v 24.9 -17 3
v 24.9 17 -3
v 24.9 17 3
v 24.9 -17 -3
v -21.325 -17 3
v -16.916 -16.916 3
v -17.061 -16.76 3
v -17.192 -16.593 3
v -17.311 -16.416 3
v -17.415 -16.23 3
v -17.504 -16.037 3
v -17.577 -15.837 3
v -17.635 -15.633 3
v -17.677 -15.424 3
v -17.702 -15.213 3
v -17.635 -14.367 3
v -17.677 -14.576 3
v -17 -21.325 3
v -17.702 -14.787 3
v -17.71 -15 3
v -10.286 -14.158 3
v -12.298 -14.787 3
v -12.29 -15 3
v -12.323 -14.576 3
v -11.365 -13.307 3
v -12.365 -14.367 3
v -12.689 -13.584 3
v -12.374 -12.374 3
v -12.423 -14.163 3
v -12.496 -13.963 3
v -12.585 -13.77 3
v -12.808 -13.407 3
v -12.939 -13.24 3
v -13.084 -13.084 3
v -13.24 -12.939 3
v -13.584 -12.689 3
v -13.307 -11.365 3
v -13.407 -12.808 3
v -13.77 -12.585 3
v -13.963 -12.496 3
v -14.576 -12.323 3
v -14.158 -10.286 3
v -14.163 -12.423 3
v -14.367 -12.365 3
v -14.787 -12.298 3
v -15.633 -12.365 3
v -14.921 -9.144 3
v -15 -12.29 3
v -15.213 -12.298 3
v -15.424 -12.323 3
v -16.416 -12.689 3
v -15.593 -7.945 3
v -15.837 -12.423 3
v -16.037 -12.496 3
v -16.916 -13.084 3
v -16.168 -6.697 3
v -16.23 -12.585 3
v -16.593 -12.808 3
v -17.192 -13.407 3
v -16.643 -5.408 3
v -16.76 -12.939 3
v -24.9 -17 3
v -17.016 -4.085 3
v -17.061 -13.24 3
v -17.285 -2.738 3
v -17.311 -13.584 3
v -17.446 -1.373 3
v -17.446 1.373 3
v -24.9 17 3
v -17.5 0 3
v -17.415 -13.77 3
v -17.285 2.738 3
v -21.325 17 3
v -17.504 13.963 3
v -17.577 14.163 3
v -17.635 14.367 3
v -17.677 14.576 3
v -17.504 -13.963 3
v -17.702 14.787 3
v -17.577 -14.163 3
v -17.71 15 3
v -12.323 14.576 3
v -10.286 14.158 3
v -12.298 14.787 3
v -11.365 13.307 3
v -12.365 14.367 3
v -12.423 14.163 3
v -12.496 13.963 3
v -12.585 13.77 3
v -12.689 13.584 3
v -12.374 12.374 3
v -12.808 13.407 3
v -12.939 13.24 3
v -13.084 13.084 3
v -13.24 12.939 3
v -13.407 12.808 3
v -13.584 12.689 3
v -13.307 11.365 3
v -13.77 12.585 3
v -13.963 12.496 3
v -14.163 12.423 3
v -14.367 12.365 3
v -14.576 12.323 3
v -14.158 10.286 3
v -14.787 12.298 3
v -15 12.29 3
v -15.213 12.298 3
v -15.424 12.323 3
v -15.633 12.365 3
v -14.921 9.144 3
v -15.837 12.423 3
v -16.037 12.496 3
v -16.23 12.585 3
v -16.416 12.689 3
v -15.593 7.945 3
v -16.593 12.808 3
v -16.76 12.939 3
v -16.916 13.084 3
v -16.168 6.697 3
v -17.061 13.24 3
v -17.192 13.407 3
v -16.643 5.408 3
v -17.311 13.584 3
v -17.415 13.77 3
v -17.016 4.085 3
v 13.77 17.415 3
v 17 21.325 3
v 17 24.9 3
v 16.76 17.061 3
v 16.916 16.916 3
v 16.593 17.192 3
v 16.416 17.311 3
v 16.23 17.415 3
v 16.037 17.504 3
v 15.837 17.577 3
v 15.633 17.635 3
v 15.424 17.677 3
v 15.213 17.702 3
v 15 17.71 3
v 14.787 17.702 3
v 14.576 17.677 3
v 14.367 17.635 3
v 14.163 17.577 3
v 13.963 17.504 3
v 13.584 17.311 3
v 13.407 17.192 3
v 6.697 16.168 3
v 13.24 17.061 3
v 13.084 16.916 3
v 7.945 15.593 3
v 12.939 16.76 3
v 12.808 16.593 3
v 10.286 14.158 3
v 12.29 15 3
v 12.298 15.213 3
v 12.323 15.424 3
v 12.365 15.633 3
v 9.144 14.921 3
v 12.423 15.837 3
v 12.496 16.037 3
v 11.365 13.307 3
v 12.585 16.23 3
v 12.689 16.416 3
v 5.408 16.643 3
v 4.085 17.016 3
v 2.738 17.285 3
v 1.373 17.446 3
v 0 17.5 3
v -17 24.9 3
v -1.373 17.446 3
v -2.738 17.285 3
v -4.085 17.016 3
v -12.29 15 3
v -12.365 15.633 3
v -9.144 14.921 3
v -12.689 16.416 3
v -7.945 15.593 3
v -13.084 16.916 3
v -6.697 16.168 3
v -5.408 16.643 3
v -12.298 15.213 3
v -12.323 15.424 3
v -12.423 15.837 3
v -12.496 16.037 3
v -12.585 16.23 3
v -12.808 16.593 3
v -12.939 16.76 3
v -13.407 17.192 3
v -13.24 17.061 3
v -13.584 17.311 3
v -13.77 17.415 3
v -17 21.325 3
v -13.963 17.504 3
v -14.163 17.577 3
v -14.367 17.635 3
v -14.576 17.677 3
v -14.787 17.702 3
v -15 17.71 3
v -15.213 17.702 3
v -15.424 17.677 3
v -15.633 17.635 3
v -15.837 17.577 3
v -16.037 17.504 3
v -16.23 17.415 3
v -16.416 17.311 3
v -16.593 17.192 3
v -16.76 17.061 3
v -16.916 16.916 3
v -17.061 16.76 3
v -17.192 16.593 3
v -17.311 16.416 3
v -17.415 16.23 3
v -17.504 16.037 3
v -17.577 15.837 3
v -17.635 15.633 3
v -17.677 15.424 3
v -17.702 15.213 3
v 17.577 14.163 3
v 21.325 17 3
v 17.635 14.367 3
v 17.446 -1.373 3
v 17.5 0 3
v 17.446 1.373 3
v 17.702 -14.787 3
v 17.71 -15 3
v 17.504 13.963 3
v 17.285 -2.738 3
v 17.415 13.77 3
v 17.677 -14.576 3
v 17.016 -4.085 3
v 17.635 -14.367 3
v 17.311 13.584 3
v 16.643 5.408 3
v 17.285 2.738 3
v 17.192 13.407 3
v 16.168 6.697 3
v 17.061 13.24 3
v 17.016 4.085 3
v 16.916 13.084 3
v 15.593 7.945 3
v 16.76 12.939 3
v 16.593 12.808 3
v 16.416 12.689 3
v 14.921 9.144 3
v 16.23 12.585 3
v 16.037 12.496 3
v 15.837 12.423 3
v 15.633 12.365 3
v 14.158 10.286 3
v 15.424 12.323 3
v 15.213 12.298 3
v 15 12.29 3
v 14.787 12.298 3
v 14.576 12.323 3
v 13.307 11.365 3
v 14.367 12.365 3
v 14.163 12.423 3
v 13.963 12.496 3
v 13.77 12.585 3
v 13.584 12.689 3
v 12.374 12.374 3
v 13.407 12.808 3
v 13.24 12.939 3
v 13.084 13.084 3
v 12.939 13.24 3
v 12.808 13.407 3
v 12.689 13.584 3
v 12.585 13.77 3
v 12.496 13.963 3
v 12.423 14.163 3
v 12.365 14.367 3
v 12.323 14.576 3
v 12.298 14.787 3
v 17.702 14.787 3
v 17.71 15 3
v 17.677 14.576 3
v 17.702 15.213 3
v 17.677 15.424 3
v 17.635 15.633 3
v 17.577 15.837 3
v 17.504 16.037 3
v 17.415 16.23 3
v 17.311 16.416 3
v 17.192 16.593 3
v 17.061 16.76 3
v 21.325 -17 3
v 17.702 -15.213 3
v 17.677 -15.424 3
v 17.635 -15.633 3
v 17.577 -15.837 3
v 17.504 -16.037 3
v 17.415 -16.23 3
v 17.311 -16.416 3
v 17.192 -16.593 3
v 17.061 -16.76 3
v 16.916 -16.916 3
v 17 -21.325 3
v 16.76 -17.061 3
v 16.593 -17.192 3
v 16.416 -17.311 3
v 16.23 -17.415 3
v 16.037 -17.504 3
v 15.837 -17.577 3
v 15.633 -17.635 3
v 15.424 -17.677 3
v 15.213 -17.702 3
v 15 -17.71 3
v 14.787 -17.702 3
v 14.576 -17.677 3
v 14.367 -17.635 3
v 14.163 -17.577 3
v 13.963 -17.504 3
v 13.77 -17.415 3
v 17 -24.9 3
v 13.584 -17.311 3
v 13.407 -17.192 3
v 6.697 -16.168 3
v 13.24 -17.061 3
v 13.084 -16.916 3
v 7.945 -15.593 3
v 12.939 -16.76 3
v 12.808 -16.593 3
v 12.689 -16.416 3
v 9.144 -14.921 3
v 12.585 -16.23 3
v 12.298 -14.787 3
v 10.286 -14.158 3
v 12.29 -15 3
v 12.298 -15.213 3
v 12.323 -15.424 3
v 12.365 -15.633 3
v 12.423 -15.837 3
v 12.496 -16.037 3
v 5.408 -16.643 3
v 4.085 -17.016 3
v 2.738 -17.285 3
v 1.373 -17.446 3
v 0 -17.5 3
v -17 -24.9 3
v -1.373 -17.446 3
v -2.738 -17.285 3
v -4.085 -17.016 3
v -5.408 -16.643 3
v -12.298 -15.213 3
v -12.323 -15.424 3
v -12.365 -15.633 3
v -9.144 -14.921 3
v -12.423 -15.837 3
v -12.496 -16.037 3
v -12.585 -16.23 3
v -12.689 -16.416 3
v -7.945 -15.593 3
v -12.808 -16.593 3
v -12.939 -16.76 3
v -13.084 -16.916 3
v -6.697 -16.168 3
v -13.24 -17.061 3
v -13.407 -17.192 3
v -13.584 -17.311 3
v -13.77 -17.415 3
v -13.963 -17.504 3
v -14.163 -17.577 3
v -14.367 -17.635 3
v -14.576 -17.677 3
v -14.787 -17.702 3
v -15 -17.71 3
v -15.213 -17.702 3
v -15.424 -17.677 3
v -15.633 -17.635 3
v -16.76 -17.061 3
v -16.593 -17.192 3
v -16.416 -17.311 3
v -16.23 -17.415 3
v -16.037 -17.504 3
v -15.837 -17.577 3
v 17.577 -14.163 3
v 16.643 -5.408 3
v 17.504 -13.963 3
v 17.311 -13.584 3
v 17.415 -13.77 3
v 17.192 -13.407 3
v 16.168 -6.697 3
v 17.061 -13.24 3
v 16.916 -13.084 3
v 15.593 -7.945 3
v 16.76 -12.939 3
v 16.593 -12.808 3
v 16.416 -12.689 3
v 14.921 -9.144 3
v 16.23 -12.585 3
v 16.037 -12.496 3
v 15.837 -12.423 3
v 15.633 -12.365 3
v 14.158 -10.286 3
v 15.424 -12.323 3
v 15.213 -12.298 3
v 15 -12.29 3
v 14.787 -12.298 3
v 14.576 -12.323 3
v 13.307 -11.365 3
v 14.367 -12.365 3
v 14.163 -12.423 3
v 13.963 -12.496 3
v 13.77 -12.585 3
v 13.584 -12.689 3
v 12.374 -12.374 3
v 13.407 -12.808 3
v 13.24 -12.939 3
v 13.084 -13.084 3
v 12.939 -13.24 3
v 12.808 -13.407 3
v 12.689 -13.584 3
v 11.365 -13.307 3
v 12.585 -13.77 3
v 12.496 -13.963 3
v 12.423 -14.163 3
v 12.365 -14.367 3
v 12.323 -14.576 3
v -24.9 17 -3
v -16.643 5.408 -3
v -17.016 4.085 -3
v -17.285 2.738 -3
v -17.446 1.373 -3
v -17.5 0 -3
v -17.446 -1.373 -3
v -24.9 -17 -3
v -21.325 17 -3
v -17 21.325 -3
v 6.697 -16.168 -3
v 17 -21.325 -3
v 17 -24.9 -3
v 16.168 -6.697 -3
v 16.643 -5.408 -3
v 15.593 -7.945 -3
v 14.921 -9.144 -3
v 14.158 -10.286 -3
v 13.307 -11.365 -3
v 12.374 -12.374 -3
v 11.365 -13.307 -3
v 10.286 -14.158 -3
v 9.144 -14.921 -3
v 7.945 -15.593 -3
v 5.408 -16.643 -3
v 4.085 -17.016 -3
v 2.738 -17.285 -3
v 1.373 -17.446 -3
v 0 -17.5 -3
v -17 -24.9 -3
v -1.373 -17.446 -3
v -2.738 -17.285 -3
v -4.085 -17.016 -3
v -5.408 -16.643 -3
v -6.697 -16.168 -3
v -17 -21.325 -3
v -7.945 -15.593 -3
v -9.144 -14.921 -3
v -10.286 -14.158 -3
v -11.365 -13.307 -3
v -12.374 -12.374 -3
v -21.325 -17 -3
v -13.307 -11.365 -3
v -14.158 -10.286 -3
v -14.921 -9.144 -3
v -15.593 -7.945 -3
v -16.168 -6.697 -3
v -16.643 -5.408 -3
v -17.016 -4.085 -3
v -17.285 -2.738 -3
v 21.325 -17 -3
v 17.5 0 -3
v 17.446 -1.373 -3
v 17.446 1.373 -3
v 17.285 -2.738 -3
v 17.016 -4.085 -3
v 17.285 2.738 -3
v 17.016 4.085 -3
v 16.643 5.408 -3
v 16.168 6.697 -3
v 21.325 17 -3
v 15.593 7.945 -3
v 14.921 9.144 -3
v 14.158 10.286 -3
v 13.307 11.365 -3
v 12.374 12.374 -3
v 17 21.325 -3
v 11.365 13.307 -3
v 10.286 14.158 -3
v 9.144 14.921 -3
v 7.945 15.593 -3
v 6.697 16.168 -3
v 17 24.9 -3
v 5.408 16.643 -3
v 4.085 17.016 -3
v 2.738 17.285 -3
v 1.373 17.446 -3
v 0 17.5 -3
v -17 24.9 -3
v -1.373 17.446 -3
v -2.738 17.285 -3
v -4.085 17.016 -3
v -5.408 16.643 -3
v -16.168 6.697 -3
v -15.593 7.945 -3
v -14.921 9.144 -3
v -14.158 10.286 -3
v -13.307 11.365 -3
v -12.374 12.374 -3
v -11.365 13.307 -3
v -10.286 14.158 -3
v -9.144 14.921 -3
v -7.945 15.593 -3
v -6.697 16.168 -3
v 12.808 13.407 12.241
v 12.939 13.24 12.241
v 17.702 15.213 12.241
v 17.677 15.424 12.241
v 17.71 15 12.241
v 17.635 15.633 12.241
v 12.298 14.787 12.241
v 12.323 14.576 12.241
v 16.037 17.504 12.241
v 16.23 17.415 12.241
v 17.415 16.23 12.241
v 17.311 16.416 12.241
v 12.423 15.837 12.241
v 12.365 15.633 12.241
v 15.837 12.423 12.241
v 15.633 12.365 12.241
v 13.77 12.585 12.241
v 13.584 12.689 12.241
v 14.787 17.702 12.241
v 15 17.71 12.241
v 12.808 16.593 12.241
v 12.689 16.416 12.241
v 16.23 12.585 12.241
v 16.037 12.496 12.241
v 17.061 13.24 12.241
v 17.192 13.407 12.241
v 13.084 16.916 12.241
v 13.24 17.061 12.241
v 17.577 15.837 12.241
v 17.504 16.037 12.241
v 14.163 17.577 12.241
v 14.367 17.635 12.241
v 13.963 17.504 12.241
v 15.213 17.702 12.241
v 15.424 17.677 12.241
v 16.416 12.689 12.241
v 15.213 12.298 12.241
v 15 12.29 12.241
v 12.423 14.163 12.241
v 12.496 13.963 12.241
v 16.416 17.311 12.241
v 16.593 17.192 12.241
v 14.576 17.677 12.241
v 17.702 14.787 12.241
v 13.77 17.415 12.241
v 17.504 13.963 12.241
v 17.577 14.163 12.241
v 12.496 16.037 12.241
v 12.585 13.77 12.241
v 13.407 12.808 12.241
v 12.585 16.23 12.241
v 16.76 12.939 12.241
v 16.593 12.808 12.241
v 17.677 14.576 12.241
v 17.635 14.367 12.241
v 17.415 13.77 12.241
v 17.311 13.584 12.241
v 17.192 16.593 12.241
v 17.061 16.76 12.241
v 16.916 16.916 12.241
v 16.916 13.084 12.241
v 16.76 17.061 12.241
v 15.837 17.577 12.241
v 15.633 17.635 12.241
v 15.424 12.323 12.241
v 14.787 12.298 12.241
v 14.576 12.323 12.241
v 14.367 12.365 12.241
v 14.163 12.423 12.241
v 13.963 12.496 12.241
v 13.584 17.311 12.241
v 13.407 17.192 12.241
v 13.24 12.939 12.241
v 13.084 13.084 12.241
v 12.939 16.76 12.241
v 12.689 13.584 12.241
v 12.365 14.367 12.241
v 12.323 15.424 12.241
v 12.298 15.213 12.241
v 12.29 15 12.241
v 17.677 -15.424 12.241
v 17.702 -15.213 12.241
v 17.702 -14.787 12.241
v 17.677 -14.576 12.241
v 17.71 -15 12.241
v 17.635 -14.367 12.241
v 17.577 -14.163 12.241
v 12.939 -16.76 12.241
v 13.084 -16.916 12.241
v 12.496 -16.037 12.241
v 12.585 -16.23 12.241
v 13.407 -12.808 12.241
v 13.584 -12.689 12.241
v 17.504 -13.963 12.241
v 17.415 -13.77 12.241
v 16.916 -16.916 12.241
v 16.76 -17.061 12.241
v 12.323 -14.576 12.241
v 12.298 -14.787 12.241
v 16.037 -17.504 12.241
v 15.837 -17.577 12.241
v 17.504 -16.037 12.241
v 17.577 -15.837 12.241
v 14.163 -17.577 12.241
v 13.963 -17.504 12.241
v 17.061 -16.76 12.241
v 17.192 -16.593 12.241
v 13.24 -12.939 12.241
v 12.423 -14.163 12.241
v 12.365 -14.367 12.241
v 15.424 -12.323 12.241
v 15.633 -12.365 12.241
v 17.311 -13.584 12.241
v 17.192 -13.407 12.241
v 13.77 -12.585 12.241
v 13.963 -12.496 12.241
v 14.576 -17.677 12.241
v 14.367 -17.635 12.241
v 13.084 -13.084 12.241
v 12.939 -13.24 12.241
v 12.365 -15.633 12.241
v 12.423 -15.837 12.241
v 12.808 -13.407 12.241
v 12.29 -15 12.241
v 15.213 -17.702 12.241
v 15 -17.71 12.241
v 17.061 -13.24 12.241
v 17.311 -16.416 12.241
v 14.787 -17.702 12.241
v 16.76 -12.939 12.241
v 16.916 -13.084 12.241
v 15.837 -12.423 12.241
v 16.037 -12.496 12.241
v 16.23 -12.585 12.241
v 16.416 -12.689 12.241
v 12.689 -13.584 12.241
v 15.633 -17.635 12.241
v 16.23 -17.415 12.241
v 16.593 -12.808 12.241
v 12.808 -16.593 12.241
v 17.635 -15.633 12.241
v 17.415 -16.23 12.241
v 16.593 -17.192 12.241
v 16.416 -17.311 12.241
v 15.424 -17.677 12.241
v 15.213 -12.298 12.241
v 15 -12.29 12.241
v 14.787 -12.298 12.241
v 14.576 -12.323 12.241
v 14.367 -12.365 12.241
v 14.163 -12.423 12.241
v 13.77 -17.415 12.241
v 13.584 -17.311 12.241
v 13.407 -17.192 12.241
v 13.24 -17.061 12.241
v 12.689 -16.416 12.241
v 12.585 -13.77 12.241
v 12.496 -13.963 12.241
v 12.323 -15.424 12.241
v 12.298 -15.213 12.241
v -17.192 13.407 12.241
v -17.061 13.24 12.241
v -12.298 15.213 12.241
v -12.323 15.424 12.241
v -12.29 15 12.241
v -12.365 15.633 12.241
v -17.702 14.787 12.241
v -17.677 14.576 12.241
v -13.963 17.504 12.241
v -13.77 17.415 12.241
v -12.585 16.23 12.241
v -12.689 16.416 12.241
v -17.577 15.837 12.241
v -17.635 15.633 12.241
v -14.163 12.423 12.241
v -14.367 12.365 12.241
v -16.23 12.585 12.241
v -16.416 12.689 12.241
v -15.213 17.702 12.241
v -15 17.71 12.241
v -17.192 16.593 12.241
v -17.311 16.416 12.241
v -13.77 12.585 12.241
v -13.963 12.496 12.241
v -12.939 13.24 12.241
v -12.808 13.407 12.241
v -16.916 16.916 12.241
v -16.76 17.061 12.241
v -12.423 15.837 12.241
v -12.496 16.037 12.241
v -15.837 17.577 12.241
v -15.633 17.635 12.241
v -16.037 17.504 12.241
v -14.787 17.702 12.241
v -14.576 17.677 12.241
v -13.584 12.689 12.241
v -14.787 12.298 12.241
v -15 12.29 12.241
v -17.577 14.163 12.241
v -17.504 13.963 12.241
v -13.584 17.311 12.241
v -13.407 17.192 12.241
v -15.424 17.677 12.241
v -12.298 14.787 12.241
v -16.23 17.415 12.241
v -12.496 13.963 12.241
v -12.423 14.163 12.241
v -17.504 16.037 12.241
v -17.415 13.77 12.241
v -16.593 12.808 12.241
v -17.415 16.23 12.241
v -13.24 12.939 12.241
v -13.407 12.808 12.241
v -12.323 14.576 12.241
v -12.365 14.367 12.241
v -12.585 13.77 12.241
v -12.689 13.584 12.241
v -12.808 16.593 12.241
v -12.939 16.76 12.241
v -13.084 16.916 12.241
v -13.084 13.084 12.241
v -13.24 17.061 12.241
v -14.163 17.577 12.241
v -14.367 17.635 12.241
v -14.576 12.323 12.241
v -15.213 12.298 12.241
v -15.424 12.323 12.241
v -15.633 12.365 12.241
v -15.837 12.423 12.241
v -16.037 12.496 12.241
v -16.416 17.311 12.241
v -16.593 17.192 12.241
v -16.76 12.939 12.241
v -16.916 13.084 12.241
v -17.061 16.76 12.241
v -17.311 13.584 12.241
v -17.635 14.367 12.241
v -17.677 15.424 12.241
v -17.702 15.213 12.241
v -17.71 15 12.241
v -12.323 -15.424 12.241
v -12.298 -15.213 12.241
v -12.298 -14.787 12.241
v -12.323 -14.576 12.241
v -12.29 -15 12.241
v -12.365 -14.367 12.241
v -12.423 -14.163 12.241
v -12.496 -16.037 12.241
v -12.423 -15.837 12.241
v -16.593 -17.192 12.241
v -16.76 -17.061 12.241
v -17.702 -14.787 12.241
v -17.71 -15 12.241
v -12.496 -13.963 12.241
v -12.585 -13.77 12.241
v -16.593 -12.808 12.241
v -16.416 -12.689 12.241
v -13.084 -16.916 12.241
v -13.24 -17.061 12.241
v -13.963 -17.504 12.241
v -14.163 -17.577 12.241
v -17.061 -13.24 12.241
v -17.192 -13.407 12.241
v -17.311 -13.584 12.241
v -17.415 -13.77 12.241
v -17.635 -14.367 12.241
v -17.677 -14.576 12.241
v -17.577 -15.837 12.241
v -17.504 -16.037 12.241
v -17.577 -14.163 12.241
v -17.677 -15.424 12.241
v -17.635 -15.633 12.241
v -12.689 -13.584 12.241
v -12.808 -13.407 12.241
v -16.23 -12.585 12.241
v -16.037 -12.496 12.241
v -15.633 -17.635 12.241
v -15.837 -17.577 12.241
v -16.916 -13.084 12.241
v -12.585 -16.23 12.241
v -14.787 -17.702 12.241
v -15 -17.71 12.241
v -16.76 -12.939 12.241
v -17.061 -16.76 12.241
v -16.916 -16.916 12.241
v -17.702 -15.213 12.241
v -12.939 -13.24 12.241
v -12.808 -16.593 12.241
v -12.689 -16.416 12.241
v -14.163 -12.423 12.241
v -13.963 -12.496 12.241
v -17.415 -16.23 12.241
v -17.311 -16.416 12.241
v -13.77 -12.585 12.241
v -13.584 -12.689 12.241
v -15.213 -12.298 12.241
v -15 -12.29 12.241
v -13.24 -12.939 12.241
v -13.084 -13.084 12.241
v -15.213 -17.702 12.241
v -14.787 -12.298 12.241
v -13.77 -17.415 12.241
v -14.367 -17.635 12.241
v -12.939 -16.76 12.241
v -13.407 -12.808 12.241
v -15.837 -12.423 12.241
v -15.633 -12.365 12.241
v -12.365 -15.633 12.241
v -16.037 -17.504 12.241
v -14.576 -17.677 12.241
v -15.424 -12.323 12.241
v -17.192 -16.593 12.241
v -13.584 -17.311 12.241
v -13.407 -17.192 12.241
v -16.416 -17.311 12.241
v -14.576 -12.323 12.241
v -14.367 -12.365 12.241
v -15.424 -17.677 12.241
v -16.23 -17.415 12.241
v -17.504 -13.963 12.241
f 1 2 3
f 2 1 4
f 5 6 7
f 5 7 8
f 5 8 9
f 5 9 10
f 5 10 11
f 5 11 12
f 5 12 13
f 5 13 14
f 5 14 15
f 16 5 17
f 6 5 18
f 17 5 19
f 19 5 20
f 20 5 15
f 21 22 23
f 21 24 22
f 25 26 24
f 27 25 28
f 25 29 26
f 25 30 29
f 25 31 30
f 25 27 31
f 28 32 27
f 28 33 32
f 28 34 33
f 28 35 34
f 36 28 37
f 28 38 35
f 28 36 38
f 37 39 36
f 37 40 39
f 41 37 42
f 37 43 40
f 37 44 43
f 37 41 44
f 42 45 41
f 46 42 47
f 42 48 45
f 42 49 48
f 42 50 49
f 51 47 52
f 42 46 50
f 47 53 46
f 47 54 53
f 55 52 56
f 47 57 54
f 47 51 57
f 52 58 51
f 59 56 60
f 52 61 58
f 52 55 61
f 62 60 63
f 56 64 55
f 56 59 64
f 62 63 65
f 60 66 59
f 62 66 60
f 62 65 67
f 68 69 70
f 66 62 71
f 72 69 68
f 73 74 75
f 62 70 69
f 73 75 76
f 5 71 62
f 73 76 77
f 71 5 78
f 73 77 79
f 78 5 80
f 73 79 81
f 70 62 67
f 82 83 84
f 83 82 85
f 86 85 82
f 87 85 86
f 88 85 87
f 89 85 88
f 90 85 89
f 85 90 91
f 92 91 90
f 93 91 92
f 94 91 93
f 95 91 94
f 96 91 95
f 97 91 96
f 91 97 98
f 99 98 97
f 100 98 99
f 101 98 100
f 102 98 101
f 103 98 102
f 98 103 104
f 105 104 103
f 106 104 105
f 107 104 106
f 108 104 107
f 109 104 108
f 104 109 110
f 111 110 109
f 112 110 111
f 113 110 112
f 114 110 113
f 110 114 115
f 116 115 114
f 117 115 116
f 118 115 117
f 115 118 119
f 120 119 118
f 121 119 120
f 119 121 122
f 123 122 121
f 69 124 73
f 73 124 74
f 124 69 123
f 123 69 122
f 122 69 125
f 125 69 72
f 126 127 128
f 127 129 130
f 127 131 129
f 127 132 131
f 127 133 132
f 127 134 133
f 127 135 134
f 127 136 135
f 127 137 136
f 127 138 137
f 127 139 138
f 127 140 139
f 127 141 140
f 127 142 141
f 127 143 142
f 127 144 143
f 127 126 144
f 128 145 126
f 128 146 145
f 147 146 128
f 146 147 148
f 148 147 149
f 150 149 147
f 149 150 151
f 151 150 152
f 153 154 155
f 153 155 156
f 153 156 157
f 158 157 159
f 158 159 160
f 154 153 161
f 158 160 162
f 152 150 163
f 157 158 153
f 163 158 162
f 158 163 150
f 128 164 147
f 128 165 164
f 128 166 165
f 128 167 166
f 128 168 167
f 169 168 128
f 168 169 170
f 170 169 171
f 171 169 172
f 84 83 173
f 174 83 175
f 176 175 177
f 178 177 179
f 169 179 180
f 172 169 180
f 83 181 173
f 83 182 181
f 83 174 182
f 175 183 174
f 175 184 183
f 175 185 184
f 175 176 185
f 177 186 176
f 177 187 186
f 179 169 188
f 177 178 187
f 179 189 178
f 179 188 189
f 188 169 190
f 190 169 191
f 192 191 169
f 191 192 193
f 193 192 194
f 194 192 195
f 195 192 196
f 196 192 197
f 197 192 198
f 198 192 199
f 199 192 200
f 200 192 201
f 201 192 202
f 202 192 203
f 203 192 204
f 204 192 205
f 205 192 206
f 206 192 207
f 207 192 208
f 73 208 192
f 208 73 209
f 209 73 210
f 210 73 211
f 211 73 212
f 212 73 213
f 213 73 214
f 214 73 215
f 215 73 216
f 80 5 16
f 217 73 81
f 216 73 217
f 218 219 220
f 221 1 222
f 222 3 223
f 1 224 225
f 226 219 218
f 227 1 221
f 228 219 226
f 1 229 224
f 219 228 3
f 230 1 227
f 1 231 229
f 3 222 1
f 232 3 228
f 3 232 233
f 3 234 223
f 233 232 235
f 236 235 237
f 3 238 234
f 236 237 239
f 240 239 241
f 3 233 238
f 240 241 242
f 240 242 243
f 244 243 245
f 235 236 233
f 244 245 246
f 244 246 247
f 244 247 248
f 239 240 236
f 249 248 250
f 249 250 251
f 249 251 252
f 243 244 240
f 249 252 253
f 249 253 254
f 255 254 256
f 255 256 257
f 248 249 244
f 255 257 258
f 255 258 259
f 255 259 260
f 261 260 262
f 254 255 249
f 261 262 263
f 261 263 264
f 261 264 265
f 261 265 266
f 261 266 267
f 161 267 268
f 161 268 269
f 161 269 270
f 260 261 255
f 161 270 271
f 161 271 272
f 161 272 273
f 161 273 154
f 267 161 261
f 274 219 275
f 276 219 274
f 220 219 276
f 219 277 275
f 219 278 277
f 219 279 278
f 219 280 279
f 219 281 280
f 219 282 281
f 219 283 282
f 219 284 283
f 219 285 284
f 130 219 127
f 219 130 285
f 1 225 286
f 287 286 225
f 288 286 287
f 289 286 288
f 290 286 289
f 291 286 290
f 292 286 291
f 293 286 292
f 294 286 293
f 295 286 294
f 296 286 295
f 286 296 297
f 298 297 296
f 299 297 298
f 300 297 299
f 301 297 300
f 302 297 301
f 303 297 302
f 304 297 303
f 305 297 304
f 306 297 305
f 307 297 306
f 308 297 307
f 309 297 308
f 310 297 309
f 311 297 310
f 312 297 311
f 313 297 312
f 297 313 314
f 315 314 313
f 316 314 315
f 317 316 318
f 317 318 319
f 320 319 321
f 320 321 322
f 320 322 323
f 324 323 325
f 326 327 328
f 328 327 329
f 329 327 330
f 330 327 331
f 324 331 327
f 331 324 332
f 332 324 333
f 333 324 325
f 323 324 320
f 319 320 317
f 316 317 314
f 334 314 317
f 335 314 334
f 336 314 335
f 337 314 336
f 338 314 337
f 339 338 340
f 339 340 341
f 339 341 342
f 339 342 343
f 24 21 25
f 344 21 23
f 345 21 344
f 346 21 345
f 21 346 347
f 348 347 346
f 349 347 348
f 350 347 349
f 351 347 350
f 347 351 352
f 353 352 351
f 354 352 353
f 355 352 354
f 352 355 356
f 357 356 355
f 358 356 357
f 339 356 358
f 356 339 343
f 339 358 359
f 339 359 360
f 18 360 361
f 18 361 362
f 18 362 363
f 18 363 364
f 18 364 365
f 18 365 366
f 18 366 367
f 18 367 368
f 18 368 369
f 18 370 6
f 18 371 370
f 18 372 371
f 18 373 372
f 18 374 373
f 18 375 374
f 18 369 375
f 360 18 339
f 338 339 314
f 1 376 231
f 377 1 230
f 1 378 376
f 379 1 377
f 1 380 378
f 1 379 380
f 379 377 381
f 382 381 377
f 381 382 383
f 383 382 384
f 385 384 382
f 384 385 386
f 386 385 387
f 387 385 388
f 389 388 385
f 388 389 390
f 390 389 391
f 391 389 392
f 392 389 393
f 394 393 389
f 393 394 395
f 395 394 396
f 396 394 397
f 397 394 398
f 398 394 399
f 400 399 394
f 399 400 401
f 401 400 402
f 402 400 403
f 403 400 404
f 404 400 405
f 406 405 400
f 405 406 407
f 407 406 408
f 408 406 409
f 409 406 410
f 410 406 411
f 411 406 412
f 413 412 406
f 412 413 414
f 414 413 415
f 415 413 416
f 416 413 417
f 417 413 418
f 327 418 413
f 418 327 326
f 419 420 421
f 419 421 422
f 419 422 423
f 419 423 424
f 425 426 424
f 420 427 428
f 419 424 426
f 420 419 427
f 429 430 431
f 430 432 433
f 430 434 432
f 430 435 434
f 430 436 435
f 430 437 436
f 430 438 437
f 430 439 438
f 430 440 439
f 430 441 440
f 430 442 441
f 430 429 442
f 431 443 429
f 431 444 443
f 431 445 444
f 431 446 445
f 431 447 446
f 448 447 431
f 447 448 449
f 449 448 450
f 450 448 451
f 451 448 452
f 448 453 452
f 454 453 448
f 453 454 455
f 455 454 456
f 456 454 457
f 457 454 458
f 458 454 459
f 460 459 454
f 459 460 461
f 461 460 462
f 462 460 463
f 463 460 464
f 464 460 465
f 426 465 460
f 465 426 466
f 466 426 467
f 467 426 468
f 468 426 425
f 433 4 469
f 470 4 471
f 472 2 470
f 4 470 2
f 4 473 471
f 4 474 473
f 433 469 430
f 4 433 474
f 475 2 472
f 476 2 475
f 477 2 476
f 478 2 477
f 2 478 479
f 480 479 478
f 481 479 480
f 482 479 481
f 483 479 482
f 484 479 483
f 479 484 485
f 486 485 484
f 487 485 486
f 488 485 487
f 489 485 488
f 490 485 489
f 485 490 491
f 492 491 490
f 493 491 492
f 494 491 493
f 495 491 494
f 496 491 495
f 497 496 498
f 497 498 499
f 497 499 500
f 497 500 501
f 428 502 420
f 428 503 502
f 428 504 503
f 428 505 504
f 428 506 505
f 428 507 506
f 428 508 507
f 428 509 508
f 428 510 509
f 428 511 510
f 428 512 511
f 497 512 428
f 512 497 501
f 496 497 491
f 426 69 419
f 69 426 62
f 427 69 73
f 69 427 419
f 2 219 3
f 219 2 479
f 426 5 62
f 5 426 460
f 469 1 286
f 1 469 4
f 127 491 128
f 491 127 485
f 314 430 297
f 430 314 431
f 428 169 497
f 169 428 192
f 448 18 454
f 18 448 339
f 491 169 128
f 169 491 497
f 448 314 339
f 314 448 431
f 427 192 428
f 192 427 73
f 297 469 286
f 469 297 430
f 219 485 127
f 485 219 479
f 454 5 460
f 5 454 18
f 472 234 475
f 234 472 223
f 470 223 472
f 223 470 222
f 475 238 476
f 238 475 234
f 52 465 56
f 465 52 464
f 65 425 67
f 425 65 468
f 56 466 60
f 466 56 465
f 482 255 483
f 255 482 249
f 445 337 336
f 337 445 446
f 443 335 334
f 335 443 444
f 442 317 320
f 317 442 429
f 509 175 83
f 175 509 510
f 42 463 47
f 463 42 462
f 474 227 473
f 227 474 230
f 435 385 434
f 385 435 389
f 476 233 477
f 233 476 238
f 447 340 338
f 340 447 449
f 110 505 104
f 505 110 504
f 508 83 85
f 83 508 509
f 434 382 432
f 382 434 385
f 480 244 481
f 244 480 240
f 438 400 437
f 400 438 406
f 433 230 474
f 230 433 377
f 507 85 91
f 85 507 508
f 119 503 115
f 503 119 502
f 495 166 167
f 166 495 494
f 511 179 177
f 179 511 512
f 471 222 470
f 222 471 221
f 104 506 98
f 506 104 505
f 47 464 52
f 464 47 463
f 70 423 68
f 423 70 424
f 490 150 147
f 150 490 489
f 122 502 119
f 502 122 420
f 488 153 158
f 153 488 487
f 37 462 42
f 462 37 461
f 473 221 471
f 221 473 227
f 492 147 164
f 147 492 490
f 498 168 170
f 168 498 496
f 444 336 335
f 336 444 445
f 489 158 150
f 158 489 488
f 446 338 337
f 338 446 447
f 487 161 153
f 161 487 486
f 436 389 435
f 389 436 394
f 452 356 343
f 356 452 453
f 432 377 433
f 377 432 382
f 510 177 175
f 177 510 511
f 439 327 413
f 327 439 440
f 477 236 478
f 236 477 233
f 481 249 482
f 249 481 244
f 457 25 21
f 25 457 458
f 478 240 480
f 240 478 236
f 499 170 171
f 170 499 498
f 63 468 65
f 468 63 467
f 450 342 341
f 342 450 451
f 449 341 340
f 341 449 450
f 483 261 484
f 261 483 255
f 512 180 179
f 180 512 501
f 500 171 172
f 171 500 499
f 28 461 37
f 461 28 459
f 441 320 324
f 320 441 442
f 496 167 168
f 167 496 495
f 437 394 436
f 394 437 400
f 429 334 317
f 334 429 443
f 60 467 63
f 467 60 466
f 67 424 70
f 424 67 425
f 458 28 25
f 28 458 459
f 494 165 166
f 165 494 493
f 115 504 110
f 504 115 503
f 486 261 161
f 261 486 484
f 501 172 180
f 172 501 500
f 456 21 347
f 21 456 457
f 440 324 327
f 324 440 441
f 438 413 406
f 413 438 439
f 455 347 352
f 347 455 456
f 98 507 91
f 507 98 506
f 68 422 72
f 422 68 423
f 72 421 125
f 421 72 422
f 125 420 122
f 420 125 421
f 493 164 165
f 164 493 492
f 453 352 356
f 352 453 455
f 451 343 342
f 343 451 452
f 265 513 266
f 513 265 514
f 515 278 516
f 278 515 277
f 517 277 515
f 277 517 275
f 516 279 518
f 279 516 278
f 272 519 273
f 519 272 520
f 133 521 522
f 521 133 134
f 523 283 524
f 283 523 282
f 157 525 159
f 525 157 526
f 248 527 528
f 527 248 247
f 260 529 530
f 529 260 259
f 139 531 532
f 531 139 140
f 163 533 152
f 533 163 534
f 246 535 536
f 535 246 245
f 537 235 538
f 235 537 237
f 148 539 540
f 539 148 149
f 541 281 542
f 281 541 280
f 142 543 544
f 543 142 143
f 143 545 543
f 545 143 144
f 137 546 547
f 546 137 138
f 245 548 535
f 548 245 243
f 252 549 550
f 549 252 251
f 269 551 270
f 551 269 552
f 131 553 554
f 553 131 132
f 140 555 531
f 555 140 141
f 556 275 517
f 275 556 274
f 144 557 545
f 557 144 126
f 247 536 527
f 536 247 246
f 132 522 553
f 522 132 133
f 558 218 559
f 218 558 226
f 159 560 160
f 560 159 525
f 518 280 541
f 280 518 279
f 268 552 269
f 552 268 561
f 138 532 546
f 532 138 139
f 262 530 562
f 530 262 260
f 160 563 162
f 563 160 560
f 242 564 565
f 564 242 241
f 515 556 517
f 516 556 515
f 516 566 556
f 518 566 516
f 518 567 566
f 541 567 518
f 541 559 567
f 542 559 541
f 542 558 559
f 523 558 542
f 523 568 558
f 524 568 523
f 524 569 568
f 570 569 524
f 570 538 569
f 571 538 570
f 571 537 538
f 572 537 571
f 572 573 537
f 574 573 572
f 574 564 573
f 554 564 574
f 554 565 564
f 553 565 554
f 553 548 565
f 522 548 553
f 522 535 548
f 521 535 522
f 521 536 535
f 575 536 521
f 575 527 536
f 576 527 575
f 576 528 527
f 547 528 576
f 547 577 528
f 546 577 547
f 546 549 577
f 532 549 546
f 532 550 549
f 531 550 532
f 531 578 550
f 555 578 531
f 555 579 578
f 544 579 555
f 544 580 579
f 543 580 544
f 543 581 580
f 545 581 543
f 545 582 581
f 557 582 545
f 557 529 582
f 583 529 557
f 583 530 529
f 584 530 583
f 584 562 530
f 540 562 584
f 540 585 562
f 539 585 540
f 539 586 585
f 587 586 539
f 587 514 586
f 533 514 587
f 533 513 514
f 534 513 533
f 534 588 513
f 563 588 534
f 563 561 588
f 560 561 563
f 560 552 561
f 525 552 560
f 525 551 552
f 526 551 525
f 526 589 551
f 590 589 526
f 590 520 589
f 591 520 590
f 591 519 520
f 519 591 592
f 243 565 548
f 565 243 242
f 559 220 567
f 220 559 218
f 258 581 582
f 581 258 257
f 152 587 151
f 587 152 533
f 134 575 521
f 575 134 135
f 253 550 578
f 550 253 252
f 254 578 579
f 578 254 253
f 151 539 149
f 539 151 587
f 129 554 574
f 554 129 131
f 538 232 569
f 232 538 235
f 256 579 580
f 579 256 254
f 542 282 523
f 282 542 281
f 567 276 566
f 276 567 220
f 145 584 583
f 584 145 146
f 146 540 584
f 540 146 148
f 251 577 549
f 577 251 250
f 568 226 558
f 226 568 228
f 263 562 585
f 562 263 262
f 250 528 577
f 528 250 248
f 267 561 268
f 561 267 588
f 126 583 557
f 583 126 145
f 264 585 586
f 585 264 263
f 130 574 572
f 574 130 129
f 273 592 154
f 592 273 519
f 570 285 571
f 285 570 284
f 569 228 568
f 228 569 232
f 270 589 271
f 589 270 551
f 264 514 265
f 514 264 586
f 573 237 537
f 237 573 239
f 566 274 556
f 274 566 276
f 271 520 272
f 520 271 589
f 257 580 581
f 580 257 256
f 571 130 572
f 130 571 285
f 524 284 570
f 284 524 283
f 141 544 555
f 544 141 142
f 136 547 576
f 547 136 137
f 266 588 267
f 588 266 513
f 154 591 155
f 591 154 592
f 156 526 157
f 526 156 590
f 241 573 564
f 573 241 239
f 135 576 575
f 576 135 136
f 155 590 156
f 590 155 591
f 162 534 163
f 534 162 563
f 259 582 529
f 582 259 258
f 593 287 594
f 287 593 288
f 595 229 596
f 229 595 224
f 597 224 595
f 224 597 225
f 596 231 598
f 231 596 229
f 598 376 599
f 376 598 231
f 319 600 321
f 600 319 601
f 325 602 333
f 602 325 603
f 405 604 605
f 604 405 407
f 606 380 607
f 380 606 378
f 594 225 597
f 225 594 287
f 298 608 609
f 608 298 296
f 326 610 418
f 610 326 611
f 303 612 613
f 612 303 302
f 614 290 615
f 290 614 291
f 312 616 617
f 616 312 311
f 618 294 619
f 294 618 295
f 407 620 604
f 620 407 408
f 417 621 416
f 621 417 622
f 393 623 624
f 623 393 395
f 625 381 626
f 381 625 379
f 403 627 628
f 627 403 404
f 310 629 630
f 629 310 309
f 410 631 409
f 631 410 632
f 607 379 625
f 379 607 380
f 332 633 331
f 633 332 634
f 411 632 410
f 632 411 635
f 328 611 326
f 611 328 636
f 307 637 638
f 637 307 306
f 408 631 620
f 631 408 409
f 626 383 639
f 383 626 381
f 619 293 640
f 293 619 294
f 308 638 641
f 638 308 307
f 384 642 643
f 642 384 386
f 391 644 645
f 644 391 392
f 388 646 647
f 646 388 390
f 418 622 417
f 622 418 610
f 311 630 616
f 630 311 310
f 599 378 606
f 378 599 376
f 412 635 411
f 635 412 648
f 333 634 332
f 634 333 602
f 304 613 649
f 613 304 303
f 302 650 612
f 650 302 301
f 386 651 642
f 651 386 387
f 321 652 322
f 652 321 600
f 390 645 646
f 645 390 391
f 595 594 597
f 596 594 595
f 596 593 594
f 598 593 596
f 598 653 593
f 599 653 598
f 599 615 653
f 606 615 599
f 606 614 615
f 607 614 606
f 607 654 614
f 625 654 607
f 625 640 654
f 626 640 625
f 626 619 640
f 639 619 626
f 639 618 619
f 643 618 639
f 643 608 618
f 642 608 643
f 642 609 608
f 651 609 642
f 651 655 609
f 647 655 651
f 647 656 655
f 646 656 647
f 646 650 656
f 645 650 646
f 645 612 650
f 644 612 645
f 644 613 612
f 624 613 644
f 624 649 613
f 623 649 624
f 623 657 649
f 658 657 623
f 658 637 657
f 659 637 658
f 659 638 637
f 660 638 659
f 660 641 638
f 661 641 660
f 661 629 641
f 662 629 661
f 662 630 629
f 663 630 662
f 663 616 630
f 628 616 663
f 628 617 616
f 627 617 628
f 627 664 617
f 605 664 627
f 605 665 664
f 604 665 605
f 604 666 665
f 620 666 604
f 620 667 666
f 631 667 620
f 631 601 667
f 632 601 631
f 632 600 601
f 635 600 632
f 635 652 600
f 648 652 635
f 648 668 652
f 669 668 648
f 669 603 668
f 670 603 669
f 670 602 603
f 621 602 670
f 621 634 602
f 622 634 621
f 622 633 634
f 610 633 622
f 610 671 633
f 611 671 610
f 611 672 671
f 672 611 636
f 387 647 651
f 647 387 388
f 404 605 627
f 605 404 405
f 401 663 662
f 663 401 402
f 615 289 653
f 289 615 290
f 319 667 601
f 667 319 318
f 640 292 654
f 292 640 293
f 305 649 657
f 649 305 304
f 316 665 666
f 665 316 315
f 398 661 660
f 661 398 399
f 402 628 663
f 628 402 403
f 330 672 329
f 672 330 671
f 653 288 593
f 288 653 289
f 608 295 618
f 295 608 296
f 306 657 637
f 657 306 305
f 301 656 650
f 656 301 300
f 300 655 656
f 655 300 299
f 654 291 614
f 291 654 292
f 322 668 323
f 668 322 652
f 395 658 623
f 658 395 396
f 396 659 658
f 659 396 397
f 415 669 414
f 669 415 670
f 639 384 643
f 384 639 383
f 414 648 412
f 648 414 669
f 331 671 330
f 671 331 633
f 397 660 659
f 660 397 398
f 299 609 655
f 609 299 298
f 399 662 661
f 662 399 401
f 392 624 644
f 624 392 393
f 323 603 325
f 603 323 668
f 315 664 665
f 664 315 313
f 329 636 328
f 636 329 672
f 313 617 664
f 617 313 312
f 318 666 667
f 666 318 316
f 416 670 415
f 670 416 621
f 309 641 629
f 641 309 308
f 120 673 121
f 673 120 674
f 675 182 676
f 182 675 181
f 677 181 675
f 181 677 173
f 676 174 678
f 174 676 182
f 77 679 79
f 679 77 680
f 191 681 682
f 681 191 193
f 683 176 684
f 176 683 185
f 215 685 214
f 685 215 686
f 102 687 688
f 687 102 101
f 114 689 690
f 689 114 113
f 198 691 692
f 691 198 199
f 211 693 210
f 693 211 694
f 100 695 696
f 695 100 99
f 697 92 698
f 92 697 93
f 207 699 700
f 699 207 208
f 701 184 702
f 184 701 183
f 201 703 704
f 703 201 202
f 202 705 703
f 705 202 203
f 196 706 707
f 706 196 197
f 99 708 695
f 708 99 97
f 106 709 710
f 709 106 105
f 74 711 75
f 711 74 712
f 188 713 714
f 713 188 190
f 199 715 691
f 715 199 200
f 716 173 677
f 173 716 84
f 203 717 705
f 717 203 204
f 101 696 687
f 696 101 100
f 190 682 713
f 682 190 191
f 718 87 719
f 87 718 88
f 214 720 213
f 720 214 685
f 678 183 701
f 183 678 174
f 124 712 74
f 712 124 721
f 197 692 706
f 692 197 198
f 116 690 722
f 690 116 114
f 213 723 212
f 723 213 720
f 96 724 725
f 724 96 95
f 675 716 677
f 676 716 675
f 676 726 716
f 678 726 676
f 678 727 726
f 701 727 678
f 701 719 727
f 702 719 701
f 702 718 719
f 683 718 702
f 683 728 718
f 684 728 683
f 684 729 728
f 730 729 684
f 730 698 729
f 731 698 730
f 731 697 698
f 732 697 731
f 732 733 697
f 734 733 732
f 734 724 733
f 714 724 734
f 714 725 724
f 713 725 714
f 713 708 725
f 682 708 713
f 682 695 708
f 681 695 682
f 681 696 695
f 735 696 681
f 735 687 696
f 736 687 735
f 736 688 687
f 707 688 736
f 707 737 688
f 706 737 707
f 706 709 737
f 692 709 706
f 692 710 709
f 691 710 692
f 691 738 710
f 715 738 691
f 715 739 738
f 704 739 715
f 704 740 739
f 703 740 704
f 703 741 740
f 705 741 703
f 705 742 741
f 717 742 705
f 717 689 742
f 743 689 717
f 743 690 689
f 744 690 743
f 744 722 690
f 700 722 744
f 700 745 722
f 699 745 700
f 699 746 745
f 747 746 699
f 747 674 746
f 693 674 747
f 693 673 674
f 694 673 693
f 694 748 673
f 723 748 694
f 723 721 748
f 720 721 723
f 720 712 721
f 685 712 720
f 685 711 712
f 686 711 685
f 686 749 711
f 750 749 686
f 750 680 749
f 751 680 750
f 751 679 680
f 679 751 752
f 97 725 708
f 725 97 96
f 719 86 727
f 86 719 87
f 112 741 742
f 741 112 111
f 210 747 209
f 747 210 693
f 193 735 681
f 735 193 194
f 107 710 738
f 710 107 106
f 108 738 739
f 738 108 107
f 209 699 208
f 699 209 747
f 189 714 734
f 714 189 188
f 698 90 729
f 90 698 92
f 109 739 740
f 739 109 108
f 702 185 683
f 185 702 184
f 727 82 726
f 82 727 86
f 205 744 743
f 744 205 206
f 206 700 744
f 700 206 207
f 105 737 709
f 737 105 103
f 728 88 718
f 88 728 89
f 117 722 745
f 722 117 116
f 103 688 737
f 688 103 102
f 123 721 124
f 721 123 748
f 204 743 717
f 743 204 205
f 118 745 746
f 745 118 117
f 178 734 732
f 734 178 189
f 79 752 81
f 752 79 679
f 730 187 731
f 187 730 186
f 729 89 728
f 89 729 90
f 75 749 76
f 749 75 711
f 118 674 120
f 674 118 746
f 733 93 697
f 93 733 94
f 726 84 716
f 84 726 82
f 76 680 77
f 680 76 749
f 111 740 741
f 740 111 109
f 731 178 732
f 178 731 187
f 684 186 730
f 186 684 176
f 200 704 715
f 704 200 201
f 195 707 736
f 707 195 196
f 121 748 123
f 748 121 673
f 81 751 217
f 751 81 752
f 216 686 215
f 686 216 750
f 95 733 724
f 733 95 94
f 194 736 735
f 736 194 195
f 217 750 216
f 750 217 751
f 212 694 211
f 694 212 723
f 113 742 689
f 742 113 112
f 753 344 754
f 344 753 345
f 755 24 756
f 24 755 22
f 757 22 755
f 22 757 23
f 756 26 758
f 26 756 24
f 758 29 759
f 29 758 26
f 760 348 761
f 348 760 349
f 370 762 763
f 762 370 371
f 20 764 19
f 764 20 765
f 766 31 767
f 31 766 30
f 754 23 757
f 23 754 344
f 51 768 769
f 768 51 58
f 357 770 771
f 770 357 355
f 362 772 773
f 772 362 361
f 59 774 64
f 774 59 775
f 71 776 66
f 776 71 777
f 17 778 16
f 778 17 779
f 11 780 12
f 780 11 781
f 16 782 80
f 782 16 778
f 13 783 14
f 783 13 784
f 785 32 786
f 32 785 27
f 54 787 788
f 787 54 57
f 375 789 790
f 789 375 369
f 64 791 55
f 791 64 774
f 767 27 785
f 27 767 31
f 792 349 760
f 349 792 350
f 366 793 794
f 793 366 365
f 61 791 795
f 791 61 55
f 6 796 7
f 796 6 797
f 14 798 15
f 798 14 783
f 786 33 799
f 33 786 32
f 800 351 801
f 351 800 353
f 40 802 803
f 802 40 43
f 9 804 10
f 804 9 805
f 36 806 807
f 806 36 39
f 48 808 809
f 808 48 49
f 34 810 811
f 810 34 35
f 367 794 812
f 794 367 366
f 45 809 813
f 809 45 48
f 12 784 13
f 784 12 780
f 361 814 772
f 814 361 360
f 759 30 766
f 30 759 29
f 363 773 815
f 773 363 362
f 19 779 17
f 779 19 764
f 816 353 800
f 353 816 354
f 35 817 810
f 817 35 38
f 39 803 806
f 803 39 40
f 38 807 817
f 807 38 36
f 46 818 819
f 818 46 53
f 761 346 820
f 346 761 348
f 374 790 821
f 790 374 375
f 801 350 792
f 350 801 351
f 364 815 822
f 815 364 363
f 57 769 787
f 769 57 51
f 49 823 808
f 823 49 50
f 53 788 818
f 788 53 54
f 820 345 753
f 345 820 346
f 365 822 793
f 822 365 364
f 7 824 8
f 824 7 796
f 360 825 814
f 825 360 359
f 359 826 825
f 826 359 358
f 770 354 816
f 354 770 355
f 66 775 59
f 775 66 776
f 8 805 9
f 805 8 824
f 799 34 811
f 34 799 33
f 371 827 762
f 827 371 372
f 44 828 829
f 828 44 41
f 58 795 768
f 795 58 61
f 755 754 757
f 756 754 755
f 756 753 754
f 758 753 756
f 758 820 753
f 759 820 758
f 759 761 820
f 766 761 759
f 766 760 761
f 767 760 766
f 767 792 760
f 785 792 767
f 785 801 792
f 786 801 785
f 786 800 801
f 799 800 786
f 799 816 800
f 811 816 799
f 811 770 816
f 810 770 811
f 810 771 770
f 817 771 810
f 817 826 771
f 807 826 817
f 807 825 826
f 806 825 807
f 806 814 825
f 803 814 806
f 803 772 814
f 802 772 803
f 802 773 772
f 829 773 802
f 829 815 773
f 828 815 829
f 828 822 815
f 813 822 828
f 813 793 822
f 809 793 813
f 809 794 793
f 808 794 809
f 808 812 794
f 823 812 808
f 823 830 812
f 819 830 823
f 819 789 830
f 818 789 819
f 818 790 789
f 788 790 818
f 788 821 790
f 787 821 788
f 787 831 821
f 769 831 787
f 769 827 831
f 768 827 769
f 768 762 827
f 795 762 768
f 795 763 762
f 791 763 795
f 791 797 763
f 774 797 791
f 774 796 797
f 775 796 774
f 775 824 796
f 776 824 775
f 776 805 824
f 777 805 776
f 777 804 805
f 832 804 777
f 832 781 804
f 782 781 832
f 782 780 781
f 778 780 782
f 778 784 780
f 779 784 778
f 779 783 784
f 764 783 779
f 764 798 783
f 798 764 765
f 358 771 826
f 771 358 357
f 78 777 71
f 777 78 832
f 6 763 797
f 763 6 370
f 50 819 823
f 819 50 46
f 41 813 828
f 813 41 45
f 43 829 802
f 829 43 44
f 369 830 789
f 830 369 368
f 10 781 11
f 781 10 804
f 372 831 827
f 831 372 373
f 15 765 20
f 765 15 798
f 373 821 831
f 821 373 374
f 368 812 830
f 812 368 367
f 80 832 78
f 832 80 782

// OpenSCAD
//Cube Insert: Thorlabs Cage System Components 

/* [User Parameters] */
//If the rods of this insert are too loose or too tight for the Thorlabs component, adjust their diameter by changing the offset (in millimetres)
off_dr = 0; //[-1:0.1:1]

/* [Hiden] */
//basic insert design
$fn = 80;
eps = .002;
a = 49.8;
b = 33.6;
c = 6.28;
d = 53.8;
h = 6;
IM_offset = 0.2;
//specific for this insert
dh = 35; //center hole diameter
dr = 5.42; //rod diameter
rp = 15; //rod pitch - half
hr = 9.24; //rod height

insert_thorlabs();

module insert_thorlabs(){
    union(){
        difference(){
            insert();
            cylinder(d = dh,h = h+eps,center = true);
        }
        translate([rp,rp,(h+hr)/2]) cylinder(d = dr+off_dr,h = hr+eps,center = true);
        translate([rp,-rp,(h+hr)/2]) cylinder(d = dr+off_dr,h = hr+eps,center = true);
        translate([-rp,rp,(h+hr)/2]) cylinder(d = dr+off_dr,h = hr+eps,center = true);
        translate([-rp,-rp,(h+hr)/2]) cylinder(d = dr+off_dr,h = hr+eps,center = true);
    }
}

module insert() {
    union() {   //basic insert design
            cube([a,b+2*IM_offset,h], center=true);
            cube([b+2*IM_offset,a,h], center=true);
            rotate(a=[0,0,45]){
                cube([c,d+2*IM_offset,h], center=true);
            }
            rotate(a=[0,0,-45]){
                cube([c,d+2*IM_offset,h], center=true);
            }
        }
}
